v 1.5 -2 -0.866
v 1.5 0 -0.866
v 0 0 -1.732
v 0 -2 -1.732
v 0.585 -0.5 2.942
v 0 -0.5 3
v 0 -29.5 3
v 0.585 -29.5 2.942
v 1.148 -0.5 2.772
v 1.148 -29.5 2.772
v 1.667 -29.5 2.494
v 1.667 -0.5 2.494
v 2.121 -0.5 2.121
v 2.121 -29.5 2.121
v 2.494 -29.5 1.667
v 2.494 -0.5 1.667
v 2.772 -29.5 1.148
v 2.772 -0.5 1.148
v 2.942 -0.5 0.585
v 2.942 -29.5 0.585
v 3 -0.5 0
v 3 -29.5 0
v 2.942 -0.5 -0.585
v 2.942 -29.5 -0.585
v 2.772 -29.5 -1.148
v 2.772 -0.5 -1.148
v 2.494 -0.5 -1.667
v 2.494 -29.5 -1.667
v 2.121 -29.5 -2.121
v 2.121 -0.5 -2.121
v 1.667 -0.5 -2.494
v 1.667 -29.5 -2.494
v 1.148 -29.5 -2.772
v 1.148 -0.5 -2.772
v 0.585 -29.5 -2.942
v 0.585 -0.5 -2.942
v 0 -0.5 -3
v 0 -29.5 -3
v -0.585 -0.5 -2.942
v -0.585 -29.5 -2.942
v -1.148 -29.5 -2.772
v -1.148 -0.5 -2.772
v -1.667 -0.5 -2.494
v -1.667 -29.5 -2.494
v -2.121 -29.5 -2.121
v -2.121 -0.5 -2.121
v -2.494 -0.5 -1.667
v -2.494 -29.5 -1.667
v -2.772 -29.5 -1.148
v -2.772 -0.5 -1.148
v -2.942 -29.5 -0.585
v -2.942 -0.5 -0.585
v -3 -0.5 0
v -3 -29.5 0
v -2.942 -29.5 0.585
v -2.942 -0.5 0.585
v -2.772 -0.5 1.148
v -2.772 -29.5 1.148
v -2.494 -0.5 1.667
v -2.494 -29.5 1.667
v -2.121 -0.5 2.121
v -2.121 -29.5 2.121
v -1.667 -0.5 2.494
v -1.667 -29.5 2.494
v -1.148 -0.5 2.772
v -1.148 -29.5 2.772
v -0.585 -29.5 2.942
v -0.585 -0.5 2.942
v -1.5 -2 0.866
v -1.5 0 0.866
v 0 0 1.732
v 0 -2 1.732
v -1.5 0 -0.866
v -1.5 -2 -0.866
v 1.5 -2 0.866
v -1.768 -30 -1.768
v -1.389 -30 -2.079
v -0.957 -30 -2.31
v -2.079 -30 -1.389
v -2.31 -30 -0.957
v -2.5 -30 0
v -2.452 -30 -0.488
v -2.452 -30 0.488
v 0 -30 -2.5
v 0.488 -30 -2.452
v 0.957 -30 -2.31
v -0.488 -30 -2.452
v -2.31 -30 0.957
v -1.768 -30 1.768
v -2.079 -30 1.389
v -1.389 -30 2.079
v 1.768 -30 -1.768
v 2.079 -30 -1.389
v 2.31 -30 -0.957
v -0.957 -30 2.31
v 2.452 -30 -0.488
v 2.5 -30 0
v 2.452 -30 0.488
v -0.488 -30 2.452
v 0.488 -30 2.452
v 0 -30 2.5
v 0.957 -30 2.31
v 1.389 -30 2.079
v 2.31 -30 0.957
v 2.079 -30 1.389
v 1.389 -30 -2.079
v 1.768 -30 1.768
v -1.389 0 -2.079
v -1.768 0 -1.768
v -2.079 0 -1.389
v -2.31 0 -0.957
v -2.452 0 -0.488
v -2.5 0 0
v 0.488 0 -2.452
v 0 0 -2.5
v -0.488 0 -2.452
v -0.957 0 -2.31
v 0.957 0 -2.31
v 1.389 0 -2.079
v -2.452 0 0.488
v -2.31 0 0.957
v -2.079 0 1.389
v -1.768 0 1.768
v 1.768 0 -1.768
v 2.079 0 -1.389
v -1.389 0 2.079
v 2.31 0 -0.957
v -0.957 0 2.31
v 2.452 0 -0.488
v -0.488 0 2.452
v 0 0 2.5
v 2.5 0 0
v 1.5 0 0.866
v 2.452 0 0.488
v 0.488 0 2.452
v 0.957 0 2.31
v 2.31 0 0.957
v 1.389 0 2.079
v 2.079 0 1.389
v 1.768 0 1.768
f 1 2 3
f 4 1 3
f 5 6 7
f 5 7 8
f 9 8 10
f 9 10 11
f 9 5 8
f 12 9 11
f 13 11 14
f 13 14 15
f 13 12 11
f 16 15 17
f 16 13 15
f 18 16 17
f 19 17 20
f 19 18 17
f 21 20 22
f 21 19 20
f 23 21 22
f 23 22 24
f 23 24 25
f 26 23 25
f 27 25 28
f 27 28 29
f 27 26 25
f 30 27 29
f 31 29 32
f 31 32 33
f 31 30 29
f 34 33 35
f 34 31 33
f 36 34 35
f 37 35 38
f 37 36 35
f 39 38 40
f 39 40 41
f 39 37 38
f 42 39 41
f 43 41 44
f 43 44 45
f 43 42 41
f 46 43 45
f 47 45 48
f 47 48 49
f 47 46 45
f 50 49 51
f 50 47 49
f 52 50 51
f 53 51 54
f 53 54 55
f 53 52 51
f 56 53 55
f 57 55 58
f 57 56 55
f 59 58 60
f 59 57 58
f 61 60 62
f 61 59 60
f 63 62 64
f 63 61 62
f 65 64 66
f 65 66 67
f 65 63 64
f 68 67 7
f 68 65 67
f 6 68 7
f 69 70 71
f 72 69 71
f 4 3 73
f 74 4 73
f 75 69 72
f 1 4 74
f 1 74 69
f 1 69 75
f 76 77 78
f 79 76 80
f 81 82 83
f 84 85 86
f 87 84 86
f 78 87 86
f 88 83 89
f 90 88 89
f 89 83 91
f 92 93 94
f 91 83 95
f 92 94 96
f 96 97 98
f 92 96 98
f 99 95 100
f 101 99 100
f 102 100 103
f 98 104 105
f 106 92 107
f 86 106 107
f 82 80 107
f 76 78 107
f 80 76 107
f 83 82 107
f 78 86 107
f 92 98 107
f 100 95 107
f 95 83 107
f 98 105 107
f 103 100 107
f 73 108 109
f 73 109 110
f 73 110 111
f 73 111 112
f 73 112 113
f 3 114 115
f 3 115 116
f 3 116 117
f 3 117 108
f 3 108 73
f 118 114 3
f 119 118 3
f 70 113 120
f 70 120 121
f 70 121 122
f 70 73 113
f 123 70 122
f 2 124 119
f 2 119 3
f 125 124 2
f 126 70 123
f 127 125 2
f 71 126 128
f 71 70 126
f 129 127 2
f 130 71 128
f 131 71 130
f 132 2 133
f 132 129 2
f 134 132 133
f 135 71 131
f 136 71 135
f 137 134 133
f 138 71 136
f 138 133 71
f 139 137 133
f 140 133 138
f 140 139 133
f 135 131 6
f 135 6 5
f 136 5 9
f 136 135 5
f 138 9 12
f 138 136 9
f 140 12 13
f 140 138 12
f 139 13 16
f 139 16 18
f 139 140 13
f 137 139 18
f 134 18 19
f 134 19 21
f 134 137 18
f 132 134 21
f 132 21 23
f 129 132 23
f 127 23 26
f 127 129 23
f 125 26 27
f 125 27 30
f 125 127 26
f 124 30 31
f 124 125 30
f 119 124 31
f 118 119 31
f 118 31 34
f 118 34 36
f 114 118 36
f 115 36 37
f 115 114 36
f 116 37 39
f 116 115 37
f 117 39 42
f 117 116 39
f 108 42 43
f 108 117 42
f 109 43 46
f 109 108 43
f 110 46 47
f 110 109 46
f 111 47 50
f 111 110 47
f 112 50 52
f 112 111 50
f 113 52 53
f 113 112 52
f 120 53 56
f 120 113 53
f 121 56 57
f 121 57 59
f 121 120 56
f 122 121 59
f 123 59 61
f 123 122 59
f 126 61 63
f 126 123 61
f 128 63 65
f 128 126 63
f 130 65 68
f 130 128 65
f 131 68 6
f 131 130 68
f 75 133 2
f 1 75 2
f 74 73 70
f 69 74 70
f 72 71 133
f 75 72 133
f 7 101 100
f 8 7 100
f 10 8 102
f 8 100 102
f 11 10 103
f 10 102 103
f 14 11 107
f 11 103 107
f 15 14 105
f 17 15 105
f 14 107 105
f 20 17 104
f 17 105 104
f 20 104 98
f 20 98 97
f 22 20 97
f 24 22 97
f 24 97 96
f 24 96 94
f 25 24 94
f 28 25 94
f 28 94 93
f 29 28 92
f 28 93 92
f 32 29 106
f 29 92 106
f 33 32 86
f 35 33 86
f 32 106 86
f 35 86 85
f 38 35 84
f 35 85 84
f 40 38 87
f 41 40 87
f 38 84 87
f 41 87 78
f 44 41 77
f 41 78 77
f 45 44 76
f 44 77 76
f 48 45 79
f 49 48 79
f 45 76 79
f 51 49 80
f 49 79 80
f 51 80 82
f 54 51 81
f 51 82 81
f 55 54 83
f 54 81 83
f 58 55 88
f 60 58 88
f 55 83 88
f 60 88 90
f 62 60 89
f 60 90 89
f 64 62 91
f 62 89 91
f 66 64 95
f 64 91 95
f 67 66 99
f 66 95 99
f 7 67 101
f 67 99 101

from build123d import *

# Parameters (mm, degrees)
SKETCH1_R           = 3
BOSS_EXTRUDE1_DEPTH = 30
CUT_EXTRUDE1_DEPTH  = 2
CHAMFER1_SIZE       = 0.5


with BuildPart() as part:
    # Sketch1 → Boss-Extrude1 (new body)
    with BuildSketch(Plane(origin=(0, 0, 0), x_dir=(1, 0, 0), z_dir=(0, 1, 0))):
        with Locations(Location((0, 0, 0), (0, 0, 270))):
            Circle(SKETCH1_R)
    extrude(amount=-BOSS_EXTRUDE1_DEPTH)

    # Sketch2 → Cut-Extrude1 (cut)
    with BuildSketch(Plane(origin=(0, 0, 0), x_dir=(1, 0, 0), z_dir=(0, 1, 0))):
        Polygon((0, 1.732050808), (-1.5, 0.866025404), (-1.5, -0.866025404), (0, -1.732050808), (1.5, -0.866025404), (1.5, 0.866025404), align=None)
    extrude(amount=-CUT_EXTRUDE1_DEPTH, mode=Mode.SUBTRACT)

    # Chamfer1
    chamfer1_edges = [part.edges().sort_by_distance(p)[0] for p in [
        (0, 0, -3),
        (0, -30, -3),
    ]]
    chamfer(chamfer1_edges, length=CHAMFER1_SIZE)


solid = part.part
